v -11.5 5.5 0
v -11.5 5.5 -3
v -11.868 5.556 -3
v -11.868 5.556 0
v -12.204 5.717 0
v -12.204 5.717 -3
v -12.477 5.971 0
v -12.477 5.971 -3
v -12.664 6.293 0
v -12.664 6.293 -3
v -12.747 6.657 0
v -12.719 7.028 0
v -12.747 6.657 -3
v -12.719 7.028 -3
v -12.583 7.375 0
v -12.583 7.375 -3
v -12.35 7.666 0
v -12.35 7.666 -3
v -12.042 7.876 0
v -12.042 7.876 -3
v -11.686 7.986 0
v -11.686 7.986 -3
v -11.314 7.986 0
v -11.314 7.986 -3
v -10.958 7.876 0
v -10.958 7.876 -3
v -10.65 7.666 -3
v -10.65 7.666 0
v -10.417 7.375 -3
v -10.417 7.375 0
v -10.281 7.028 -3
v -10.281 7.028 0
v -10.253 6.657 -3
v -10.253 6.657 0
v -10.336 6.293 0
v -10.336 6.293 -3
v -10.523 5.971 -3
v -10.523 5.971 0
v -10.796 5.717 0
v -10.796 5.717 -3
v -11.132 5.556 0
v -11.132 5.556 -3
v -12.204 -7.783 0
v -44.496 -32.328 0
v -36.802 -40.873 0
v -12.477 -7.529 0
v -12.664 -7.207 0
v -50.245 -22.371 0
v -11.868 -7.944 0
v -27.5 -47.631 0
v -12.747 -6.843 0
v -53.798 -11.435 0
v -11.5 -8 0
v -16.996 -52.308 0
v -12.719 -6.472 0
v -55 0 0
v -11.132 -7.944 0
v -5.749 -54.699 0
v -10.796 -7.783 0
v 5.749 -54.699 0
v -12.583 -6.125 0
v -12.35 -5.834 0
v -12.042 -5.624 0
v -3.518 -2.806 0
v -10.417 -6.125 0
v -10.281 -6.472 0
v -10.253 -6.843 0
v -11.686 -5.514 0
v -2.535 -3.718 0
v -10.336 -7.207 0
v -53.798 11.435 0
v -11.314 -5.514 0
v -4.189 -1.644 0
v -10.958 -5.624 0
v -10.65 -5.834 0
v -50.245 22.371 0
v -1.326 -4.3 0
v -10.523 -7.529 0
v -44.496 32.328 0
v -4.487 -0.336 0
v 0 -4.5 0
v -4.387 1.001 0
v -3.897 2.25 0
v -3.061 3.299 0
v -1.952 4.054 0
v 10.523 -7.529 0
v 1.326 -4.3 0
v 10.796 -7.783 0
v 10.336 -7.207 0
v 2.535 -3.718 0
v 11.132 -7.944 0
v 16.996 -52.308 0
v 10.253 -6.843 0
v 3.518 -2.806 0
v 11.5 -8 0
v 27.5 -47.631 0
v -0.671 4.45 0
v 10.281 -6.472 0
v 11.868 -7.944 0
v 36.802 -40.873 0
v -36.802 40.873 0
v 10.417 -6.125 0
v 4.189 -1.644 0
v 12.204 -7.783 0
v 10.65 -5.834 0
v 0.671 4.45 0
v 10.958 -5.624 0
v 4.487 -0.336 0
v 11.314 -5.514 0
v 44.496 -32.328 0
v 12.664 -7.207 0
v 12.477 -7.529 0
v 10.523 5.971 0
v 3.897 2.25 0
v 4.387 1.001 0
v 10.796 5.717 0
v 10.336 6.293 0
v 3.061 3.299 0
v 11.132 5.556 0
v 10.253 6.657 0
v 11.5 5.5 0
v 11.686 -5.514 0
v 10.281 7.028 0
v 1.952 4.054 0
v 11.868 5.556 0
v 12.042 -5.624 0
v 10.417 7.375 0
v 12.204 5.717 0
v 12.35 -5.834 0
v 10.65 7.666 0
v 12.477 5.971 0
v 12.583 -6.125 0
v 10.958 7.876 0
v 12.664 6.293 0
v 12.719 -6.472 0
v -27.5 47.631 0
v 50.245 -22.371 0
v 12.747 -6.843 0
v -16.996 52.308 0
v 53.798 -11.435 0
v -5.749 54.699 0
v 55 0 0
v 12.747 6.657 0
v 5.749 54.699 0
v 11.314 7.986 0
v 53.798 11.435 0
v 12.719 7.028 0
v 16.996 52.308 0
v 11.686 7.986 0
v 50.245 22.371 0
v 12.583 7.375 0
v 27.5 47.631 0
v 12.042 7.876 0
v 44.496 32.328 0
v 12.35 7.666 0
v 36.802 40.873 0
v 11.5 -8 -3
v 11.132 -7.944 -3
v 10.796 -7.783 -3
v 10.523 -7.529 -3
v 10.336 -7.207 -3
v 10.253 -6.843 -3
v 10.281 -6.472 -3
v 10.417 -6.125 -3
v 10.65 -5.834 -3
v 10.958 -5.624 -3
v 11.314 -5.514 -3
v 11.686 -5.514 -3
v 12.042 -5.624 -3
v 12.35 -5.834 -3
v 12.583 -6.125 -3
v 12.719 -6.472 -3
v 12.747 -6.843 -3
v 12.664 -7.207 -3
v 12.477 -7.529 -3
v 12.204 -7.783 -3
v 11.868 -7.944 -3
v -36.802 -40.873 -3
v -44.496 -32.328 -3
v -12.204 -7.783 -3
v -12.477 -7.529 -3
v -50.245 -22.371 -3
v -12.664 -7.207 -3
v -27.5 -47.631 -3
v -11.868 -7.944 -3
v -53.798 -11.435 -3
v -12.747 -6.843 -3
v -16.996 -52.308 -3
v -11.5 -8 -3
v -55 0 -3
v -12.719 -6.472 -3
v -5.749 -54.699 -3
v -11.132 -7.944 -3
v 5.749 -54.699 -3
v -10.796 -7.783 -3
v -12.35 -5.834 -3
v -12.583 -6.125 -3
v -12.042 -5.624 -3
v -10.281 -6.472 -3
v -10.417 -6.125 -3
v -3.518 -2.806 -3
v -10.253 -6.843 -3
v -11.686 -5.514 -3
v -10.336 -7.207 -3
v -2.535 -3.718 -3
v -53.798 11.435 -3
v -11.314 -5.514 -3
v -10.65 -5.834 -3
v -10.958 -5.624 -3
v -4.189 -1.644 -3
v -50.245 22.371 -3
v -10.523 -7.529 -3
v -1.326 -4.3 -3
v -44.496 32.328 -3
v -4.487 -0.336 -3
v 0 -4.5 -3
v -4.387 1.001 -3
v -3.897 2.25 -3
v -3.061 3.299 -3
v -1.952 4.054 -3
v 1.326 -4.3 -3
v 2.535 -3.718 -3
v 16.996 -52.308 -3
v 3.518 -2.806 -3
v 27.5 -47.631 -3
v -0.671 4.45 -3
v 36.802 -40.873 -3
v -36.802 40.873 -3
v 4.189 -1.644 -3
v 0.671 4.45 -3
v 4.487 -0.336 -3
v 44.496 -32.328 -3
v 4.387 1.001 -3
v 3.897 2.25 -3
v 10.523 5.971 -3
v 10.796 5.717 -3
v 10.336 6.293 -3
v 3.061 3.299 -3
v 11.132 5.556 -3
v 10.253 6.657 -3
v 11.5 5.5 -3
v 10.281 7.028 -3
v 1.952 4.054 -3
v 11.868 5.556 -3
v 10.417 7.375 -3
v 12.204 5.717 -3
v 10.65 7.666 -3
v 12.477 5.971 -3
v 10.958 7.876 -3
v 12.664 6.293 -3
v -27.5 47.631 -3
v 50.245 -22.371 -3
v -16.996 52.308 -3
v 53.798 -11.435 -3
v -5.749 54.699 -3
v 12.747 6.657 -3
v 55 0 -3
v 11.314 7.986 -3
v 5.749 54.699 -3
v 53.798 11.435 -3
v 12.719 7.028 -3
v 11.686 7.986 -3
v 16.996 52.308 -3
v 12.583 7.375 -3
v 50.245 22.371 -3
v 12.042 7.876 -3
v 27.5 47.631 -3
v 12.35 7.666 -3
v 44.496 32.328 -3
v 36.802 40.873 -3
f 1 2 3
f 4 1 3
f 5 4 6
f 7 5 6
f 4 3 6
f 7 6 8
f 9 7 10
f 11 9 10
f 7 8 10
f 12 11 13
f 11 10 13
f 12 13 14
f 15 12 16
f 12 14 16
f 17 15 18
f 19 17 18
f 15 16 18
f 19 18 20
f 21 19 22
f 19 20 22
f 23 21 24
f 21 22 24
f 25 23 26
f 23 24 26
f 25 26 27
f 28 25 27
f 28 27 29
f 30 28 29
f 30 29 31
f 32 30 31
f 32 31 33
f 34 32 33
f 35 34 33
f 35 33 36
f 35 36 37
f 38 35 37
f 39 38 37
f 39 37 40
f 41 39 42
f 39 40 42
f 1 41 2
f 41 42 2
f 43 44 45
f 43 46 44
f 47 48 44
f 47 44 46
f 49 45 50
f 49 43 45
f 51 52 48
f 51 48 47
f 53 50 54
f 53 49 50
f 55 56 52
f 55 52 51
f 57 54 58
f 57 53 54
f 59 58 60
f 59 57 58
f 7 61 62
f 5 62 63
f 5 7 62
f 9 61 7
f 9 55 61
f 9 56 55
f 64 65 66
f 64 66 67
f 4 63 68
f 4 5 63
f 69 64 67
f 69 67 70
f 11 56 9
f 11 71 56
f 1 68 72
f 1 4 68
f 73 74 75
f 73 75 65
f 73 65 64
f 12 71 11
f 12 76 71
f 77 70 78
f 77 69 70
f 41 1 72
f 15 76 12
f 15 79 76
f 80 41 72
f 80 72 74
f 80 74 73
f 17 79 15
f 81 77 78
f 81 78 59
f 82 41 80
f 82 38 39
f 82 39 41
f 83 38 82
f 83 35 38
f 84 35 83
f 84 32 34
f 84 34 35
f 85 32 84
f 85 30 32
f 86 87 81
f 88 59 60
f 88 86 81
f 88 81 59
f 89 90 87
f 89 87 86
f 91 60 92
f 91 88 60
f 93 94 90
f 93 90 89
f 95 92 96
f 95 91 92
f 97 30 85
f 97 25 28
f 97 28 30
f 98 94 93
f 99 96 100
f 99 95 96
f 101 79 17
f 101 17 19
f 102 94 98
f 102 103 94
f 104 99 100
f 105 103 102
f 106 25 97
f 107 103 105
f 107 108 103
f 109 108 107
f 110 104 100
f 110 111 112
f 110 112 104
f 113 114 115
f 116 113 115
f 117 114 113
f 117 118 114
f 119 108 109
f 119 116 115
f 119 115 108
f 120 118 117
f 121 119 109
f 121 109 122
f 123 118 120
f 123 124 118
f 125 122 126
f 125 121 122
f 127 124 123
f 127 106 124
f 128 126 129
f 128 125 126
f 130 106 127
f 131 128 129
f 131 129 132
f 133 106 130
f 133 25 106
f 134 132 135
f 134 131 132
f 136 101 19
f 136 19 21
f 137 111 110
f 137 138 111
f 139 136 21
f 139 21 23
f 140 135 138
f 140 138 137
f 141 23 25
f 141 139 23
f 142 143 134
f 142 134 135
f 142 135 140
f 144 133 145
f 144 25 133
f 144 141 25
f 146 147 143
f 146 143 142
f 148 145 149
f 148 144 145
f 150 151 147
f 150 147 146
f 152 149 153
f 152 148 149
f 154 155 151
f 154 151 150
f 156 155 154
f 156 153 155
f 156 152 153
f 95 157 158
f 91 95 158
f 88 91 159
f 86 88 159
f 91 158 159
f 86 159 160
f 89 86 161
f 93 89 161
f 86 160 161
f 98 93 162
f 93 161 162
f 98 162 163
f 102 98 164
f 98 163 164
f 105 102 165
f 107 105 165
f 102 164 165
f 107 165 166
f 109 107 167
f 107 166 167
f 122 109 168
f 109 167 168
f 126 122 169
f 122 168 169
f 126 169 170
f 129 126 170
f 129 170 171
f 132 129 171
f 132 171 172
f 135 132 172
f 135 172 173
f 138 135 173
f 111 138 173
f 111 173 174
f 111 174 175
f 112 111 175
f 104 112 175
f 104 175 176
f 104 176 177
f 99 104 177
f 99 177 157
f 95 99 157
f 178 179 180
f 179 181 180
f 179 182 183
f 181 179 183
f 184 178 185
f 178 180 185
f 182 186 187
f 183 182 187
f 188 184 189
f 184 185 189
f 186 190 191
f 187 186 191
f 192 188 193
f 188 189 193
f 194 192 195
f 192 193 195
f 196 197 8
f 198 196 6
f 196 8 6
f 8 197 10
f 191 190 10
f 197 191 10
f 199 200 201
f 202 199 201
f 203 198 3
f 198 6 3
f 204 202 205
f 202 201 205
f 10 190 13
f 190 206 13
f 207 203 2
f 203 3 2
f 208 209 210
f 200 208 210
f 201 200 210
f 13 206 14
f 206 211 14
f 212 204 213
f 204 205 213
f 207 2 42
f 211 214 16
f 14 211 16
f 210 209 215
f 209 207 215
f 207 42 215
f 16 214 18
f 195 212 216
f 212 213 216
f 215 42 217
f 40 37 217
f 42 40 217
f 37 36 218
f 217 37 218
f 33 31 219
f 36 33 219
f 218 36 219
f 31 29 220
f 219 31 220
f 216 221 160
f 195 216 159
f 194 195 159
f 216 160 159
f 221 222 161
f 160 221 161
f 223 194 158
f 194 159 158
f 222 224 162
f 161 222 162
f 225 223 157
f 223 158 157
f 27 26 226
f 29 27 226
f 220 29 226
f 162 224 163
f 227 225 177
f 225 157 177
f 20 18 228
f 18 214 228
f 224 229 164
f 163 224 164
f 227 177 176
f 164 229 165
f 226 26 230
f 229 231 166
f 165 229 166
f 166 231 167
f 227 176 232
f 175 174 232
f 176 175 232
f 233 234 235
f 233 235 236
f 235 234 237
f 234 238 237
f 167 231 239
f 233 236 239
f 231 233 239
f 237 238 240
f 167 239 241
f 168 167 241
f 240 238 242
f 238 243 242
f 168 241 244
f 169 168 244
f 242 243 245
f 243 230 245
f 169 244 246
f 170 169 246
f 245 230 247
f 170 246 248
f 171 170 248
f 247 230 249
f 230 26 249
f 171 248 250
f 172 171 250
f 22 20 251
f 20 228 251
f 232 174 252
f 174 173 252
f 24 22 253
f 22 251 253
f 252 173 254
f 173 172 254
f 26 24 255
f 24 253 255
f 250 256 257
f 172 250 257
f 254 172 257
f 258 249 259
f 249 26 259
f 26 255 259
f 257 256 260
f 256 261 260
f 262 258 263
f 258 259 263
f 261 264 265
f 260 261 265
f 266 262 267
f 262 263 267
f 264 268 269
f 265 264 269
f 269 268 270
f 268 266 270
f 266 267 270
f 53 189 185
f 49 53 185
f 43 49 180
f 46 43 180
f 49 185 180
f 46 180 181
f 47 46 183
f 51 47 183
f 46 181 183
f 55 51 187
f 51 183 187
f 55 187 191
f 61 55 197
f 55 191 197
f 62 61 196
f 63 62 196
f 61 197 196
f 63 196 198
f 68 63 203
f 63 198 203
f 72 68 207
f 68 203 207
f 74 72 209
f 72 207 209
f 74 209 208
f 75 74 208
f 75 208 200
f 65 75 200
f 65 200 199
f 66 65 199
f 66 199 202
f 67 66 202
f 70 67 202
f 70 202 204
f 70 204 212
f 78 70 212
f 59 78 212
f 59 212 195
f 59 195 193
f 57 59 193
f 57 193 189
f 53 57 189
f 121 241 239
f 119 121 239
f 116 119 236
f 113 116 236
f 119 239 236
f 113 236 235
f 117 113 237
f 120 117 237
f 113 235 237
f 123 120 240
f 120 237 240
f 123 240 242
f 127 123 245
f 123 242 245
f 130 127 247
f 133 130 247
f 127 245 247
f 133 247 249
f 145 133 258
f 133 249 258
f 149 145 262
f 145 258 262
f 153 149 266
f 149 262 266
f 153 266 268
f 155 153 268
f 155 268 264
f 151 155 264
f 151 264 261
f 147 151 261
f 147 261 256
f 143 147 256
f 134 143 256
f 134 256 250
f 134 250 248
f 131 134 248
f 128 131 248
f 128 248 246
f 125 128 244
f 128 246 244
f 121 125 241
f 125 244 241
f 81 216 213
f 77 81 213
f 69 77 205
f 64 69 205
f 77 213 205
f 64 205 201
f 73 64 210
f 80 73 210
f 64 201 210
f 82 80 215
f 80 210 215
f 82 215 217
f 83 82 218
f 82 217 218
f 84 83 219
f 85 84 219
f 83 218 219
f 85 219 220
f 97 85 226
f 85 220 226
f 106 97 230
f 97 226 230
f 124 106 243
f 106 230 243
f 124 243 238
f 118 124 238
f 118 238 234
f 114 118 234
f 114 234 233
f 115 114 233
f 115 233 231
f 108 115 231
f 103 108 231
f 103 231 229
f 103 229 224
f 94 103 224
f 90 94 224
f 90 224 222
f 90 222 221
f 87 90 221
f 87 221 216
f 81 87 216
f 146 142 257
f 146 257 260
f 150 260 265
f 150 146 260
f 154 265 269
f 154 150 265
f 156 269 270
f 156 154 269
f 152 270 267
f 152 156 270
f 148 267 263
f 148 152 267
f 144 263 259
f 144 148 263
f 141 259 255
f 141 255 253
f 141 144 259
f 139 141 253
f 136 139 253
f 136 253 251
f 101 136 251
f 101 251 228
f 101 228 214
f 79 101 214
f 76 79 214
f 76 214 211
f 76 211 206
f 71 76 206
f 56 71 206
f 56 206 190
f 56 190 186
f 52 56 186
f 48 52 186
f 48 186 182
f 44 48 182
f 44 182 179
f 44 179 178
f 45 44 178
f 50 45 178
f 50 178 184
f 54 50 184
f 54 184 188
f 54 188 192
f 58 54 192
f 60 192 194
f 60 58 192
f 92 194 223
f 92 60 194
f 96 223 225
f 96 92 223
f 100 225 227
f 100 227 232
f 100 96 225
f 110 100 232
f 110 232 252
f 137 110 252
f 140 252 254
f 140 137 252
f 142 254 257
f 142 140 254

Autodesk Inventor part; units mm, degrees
ref_plane "YZ Plane" through (0, 0, 0) normal (1, 0, 0) x (0, 1, 0)
ref_plane "XZ Plane" through (0, 0, 0) normal (0, 1, 0) x (-1, 0, 0)
ref_plane "XY Plane" through (0, 0, 0) normal (0, 0, 1) x (1, 0, 0)
sketch "Boceto1" plane through (0, 0, 0) normal (0, 0, 1) x (1, 0, 0)
  circle A0 centre (0, 0) radius 55
extrude "Extrusión1" add sketch "Boceto1" against normal blind 3
sketch "Boceto2" plane through (0, 0, 0) normal (0, 0, 1) x (1, 0, 0)
  circle A0 centre (0, 0) radius 4.5
hole "Agujero1" at (0, 0, 0) direction (0, 0, -1) diameter 9 end through all
sketch "Boceto3" plane through (0, 0, 0) normal (0, 0, 1) x (1, 0, 0)
  line L0 (0, 0) -> (-11.5, 0)
  circle A0 centre (-11.5, 6.75) radius 1.25
  circle A1 centre (11.5, 6.75) radius 1.25
  circle A2 centre (11.5, -6.75) radius 1.25
  circle A3 centre (-11.5, -6.75) radius 1.25
hole "Agujero2" at (11.5, -6.75, 0) at (-11.5, 6.75, 0) at (-11.5, -6.75, 0) at (11.5, 6.75, 0) direction (0, 0, -1) diameter 2.5 end through all
sketch "Boceto4" plane through (0, 0, -3) normal (0, 0, -1) x (-1, 0, 0)
  point P0 (0, 0)
properties part number "Base2"
